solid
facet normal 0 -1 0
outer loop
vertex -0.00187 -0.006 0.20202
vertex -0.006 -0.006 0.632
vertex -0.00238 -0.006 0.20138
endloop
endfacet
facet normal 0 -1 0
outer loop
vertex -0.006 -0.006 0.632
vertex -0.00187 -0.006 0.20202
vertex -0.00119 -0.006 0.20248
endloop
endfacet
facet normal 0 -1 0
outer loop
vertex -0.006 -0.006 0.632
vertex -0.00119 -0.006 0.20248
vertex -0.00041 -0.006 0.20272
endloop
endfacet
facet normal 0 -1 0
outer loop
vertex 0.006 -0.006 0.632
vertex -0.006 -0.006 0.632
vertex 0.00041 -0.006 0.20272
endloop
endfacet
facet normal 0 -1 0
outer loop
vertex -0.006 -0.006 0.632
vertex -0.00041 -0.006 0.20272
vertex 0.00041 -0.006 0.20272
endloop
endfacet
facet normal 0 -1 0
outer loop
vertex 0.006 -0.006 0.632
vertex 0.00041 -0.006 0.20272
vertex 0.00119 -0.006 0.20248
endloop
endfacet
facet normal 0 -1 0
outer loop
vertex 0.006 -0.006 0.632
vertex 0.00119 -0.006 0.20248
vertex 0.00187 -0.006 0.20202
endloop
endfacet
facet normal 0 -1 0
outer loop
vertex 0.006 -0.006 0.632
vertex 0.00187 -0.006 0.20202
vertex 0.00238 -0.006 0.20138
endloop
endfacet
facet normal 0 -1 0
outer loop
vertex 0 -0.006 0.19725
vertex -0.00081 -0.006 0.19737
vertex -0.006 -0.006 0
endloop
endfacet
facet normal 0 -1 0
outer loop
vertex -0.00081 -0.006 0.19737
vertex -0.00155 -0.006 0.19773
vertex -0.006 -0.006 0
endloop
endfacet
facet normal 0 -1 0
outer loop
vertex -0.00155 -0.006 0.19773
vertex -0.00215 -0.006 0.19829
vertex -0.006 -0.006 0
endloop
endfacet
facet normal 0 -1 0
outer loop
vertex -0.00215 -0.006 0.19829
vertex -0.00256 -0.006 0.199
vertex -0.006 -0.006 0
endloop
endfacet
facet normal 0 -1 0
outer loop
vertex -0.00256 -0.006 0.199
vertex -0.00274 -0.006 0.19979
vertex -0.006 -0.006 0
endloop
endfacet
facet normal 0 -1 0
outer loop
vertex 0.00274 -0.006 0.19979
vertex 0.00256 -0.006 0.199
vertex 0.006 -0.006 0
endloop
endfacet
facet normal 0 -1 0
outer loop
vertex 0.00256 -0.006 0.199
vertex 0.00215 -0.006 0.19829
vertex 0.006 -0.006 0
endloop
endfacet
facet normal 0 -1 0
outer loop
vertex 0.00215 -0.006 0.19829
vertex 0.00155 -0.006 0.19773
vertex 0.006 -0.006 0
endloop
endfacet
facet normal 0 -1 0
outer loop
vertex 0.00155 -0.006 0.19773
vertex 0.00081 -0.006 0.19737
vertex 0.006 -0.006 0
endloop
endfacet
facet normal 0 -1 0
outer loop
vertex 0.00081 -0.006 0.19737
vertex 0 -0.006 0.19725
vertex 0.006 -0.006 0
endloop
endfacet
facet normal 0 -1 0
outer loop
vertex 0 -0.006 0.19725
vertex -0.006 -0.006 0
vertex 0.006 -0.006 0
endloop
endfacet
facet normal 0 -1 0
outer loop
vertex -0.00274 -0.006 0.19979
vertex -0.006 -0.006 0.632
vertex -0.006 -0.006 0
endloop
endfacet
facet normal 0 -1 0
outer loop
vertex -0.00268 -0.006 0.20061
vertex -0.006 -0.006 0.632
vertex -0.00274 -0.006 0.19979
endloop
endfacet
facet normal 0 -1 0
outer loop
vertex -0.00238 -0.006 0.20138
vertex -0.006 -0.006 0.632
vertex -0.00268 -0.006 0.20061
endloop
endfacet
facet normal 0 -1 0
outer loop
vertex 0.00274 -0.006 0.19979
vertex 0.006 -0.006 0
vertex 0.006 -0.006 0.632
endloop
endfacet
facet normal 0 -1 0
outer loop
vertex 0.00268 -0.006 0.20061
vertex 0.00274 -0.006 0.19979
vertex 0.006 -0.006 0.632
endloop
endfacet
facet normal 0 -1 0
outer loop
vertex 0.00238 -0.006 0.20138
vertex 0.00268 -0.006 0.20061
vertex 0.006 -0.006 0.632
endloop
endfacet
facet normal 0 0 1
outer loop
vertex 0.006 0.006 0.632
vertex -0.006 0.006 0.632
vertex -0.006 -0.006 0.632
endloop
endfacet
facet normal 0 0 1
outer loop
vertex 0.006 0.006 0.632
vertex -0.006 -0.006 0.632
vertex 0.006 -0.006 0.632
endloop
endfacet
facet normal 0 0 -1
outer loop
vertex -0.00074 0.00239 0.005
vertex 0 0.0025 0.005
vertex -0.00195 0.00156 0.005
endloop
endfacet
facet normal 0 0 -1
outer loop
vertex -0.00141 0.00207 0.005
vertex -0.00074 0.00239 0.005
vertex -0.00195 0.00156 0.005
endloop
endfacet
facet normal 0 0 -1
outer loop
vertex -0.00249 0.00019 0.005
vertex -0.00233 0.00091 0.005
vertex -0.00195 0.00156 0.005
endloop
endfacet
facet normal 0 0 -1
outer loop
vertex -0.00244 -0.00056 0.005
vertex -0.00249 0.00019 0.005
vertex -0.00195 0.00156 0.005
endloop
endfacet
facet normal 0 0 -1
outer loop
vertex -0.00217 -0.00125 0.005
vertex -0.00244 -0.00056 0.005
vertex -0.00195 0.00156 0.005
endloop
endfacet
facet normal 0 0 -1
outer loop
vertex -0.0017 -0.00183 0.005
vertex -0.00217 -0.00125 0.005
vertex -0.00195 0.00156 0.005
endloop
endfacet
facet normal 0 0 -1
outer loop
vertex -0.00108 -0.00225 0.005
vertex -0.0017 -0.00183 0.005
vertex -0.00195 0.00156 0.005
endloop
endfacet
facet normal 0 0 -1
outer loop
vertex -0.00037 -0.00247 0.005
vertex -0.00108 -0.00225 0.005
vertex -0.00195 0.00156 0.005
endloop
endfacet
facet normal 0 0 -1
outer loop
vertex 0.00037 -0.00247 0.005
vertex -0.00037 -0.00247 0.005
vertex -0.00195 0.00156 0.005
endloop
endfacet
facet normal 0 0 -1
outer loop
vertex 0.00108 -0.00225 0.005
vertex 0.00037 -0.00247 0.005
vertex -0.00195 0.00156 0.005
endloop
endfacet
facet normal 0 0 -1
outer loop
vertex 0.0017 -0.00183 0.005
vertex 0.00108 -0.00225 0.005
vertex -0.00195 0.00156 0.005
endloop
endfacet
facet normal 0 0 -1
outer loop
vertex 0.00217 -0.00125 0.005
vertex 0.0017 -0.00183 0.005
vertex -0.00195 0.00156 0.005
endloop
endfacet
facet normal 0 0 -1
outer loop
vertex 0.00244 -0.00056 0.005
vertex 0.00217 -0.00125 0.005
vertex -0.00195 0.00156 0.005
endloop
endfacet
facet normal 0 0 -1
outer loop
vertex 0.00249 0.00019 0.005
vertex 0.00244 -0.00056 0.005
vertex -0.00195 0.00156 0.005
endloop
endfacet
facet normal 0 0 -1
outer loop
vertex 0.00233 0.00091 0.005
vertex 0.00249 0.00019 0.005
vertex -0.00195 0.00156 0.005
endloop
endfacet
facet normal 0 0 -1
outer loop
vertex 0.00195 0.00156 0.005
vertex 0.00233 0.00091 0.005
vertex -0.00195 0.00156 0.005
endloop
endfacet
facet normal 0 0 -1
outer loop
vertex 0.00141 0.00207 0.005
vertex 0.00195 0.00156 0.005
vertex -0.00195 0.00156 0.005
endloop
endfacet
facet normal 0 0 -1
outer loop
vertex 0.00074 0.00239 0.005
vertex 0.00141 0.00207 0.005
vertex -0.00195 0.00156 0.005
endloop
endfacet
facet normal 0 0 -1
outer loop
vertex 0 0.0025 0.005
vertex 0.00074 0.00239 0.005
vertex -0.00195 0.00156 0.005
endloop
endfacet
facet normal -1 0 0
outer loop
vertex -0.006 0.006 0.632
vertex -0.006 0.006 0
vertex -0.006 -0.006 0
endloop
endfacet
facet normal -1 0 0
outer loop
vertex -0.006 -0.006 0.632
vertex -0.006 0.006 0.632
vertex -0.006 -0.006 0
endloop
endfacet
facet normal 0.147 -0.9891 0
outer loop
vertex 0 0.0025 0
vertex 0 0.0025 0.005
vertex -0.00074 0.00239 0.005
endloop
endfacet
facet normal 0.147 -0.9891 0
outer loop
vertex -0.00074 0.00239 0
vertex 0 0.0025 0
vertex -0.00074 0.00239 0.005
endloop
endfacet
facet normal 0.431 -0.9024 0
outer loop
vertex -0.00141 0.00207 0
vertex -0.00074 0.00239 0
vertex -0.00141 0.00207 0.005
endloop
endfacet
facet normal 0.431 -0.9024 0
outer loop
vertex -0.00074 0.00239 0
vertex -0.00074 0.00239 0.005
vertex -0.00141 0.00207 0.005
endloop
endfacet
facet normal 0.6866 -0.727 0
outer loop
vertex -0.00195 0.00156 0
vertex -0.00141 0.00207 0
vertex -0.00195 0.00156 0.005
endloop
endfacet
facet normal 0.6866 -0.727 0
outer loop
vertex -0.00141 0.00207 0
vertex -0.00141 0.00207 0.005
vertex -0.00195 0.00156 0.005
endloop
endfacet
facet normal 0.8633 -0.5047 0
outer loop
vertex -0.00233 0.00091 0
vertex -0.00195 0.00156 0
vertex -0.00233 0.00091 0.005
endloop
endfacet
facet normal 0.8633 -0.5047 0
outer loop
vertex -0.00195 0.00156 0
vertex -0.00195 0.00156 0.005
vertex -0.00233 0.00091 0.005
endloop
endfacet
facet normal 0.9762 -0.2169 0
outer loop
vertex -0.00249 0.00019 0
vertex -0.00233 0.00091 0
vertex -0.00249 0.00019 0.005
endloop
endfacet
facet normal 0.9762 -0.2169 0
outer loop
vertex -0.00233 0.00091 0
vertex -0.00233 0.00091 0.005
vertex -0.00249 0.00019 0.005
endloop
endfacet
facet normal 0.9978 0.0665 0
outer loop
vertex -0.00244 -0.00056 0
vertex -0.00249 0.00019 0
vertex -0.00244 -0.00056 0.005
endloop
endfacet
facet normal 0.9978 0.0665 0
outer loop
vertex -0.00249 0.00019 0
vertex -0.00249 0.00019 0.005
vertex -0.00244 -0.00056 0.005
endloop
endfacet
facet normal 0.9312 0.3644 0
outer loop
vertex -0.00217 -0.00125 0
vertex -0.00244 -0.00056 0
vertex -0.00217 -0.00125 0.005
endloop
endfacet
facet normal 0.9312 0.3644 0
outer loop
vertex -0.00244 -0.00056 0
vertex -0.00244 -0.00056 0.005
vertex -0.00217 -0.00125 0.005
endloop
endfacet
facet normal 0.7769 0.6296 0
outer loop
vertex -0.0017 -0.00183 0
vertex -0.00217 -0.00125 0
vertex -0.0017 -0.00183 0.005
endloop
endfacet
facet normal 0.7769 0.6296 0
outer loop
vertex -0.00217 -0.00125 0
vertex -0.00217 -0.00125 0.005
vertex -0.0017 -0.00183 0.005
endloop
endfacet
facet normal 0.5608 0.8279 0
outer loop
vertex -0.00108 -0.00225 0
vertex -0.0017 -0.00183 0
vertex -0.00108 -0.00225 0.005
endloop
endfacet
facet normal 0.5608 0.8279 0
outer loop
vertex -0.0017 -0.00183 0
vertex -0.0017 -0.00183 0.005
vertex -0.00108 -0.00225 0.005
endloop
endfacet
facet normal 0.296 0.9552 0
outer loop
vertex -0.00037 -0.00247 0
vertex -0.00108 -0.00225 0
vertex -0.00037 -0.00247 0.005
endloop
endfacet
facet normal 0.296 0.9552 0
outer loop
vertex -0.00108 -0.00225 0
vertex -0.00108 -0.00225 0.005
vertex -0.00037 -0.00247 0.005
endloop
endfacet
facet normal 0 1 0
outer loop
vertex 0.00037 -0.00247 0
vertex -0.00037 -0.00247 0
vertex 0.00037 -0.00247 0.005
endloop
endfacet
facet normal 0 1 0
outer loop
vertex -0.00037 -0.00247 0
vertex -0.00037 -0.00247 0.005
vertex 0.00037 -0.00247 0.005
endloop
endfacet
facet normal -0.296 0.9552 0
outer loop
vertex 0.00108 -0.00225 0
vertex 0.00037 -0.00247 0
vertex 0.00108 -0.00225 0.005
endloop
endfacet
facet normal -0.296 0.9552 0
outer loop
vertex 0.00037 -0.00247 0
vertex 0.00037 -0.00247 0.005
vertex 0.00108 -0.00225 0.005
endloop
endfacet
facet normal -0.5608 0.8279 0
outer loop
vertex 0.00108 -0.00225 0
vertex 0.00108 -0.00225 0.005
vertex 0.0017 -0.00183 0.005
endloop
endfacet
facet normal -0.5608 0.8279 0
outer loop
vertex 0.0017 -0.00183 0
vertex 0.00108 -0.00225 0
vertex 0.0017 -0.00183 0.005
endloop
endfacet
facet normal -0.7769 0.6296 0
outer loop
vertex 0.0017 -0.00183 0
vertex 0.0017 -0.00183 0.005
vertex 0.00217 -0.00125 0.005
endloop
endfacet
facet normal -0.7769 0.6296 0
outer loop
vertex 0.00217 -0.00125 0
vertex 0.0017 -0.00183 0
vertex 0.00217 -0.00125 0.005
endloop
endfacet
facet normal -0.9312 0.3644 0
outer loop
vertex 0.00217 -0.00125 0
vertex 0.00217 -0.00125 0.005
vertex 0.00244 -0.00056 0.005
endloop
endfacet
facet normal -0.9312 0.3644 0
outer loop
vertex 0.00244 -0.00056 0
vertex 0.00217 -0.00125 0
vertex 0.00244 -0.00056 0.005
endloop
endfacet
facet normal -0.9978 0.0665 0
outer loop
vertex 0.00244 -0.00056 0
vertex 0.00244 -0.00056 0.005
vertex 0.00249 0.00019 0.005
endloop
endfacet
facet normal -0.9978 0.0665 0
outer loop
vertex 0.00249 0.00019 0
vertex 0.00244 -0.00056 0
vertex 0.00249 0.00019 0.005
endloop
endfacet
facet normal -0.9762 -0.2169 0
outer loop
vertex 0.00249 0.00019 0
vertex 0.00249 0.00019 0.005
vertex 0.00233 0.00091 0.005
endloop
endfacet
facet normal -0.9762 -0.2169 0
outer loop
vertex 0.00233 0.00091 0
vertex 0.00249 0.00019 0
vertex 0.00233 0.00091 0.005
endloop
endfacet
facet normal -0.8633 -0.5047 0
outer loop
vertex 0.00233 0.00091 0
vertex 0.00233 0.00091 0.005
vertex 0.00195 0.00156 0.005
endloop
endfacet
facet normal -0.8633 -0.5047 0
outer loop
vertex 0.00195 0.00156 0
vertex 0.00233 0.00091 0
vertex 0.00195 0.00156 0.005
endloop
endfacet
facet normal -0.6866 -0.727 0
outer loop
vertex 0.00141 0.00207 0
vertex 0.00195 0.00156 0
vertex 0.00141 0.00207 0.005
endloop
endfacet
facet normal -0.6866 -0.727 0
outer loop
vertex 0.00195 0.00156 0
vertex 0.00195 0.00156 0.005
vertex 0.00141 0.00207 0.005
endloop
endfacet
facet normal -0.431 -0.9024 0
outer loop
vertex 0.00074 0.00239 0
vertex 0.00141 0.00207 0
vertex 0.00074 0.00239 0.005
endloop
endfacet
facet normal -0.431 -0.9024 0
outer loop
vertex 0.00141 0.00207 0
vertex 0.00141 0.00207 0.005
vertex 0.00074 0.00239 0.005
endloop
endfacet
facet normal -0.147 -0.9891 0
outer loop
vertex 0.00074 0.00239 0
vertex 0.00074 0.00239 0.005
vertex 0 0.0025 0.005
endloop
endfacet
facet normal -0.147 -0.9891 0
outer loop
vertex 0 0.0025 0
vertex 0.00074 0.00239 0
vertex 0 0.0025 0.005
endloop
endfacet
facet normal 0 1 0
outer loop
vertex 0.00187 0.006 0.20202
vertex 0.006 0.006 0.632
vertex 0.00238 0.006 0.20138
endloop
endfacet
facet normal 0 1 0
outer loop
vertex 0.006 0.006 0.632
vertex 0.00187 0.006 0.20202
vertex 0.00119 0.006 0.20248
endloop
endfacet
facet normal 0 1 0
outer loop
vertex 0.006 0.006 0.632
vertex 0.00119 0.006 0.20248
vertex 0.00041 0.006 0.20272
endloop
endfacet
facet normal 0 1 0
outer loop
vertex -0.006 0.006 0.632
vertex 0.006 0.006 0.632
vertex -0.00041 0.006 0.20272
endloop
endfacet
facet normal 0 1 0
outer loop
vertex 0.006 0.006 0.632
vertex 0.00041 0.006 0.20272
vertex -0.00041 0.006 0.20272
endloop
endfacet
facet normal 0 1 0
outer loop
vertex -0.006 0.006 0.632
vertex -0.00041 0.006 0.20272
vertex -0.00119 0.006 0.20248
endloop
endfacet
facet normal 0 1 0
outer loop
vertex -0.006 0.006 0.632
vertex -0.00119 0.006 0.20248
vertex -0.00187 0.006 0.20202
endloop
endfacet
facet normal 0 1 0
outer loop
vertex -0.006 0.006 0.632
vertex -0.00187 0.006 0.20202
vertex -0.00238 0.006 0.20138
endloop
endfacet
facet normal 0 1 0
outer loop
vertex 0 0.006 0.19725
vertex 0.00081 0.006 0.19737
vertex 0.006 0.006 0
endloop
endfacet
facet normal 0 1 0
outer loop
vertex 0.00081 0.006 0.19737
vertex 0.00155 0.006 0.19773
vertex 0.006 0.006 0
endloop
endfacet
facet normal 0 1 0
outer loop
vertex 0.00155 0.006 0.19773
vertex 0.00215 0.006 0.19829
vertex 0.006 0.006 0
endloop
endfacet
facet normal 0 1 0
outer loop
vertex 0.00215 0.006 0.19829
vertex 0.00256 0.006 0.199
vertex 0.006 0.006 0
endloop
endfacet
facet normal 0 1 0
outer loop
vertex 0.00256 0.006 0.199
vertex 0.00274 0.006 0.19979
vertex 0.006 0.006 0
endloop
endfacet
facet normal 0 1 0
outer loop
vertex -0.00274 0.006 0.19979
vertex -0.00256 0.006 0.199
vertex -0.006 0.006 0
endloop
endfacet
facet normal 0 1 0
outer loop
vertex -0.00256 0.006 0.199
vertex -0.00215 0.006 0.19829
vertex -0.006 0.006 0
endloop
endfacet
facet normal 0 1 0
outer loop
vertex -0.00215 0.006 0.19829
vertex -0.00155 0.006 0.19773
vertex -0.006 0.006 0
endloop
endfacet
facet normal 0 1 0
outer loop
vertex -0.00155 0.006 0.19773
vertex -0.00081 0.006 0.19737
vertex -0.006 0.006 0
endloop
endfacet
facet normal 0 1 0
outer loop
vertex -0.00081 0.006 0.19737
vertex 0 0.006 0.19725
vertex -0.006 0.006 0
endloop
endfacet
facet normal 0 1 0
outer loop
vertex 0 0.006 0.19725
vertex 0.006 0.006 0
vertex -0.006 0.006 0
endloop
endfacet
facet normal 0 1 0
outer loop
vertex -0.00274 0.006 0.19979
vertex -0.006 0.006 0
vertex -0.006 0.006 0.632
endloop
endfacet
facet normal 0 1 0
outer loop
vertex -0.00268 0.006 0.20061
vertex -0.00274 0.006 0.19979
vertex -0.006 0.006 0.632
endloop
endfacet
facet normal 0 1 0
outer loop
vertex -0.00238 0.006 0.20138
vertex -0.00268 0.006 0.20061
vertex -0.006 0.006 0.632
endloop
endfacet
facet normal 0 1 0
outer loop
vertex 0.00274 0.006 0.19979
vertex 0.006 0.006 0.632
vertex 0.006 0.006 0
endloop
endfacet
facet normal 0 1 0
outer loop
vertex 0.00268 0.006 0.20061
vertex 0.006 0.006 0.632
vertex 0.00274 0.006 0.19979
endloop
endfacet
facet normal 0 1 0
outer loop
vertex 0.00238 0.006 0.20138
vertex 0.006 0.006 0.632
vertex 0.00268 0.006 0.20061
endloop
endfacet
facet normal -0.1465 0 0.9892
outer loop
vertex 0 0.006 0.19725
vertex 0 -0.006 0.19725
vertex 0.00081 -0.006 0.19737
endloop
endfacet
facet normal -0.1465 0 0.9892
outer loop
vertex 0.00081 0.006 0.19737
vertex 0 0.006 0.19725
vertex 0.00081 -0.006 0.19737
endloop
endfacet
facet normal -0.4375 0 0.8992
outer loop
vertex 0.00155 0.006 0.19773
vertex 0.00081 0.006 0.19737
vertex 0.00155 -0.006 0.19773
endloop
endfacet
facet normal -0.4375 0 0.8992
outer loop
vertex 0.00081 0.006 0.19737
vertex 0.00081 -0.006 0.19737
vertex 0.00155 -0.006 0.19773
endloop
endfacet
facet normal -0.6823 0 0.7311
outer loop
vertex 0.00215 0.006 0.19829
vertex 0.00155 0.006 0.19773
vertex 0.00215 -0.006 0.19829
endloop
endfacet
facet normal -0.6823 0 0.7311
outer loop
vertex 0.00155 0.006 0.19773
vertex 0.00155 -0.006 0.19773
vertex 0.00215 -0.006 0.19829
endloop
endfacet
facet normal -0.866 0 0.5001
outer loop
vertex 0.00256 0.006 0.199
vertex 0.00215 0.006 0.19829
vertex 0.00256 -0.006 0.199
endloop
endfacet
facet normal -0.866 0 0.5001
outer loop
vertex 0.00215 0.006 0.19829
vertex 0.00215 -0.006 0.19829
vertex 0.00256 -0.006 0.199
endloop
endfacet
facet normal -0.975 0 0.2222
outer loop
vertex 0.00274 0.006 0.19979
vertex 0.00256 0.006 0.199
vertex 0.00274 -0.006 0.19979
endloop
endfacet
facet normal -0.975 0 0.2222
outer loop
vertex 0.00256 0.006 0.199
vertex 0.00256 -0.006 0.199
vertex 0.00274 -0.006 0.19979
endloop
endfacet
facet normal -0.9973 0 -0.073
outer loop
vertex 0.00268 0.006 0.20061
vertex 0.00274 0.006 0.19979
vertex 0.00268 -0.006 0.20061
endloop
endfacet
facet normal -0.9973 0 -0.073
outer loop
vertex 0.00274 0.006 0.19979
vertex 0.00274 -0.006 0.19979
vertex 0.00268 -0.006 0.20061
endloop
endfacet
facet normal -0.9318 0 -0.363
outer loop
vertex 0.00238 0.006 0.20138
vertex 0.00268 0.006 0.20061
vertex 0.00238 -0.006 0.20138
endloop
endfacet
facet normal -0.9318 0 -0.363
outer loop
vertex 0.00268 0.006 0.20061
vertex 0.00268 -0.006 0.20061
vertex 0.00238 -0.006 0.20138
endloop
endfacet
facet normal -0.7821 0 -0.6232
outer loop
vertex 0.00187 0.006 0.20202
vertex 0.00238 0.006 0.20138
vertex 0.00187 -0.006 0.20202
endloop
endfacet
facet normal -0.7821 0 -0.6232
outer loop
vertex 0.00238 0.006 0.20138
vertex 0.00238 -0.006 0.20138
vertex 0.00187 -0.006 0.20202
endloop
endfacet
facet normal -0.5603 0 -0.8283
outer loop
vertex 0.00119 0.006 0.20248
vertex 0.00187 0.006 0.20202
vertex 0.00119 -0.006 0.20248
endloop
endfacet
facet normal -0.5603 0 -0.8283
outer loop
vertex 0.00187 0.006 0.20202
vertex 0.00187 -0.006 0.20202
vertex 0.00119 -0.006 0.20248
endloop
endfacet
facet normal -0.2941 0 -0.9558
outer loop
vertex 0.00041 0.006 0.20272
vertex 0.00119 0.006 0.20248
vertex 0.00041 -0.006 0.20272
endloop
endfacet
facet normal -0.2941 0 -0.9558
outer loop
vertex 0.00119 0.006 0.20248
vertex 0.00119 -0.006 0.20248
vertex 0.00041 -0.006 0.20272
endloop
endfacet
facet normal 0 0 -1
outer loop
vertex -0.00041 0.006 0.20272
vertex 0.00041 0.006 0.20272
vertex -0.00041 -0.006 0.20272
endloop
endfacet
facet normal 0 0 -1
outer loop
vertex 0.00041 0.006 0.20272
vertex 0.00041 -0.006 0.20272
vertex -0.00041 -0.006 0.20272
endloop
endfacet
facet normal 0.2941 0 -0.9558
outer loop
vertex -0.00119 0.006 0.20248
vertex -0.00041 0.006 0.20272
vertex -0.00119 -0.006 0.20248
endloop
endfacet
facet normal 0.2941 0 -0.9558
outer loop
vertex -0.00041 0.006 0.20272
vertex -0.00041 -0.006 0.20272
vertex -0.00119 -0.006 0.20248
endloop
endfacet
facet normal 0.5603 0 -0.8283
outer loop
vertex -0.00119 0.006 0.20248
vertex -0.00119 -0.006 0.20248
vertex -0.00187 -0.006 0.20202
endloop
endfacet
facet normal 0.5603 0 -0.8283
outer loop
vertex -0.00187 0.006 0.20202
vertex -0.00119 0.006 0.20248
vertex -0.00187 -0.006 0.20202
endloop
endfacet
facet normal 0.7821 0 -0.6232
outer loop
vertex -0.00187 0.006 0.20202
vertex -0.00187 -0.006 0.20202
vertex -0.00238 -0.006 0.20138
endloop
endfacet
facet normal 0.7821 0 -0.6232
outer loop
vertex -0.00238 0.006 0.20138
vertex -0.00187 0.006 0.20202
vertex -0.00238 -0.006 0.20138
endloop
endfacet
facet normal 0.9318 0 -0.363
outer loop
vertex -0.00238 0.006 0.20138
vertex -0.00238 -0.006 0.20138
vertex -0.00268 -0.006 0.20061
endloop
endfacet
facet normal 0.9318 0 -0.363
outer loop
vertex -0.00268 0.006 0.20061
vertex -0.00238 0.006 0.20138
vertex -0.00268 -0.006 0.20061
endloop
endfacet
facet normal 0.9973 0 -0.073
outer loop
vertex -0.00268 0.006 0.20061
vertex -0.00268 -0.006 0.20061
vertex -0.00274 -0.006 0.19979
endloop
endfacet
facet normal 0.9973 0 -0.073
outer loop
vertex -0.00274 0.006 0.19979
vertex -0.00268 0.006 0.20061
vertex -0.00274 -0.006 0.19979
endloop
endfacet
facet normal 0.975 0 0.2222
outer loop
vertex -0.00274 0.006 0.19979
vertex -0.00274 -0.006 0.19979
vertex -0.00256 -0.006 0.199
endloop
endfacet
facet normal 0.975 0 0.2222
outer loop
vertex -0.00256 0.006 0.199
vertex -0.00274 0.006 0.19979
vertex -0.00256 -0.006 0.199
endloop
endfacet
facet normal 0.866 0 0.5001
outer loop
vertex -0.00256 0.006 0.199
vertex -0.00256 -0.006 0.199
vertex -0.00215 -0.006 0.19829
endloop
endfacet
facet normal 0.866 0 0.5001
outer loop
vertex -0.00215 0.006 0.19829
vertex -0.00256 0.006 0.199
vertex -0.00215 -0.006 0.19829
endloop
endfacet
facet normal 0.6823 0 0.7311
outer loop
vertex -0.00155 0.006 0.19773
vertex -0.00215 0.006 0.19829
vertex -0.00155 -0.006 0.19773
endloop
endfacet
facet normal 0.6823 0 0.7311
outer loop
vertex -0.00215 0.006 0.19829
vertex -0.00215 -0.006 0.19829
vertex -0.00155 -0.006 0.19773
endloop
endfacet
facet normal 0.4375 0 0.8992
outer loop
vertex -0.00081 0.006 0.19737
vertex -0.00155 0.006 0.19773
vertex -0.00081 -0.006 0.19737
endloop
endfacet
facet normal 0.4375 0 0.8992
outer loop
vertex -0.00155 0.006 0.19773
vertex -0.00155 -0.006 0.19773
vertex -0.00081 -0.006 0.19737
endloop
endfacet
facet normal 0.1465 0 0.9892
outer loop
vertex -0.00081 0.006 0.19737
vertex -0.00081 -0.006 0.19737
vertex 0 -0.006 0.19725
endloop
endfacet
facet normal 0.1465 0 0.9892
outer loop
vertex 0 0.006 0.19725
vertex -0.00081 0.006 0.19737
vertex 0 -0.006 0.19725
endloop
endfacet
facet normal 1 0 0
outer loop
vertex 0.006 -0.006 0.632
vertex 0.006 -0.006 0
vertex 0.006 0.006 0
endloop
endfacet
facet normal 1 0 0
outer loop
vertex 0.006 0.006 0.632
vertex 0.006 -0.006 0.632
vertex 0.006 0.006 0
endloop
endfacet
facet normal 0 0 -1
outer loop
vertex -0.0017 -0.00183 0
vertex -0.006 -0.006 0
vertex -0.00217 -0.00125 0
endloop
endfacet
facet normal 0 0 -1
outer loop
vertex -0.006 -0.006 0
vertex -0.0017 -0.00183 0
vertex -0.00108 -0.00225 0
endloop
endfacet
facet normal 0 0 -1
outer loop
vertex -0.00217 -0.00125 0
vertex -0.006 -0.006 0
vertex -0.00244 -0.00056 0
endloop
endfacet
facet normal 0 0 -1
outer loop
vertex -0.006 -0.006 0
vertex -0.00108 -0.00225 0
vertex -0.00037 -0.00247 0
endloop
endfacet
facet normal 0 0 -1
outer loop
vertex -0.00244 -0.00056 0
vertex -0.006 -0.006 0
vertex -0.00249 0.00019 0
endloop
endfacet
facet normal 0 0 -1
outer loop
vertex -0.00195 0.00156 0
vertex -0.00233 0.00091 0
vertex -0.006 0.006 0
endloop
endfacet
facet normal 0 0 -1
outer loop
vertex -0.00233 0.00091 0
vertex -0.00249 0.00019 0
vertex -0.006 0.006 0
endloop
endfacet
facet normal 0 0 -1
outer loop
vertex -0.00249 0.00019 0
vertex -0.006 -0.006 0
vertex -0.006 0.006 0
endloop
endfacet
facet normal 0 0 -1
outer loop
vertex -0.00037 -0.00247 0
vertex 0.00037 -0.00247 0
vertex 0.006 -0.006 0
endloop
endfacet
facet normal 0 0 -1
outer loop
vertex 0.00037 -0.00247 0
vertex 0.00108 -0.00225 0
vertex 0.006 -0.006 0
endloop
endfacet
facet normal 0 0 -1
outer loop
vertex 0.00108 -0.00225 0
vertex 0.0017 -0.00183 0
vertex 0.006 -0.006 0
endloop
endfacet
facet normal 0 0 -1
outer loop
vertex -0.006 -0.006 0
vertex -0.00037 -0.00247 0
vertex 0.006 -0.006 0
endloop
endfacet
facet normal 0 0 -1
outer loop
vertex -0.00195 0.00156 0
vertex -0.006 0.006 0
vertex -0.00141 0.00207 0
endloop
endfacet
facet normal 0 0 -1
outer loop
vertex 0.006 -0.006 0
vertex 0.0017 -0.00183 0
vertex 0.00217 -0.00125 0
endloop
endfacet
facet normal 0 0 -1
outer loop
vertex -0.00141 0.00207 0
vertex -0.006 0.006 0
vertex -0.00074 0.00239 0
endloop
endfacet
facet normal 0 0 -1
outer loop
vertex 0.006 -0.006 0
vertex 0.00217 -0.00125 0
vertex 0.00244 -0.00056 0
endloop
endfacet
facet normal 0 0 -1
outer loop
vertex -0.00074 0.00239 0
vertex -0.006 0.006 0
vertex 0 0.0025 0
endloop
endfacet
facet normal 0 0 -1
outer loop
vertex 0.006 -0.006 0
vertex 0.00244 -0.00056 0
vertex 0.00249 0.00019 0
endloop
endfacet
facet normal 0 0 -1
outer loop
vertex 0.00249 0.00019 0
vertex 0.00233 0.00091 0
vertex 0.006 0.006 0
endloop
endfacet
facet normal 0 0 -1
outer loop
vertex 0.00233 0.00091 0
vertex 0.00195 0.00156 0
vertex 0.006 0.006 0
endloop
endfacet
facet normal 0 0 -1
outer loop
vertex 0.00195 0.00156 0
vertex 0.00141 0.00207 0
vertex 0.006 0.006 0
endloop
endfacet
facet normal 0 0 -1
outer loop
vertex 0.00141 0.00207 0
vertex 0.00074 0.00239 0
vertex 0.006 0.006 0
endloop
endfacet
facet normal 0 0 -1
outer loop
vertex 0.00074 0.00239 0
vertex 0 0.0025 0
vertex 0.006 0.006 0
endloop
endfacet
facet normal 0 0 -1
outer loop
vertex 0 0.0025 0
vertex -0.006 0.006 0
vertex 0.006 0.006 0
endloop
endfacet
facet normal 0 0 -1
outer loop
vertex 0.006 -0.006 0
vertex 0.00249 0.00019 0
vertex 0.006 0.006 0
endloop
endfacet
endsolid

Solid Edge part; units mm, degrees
sketch "Sketch1" plane through (0, 0, 0) normal (0, 0, 1) x (1, 0, 0)
  line L0 (-0.006, -0.006) -> (0.006, -0.006)
  line L1 (0.006, -0.006) -> (0.006, 0.006)
  line L2 (0.006, 0.006) -> (-0.006, 0.006)
  line L3 (-0.006, 0.006) -> (-0.006, -0.006)
  dimension "D1" = 0.012
extrude "Protrusion1" add sketch "Sketch1" along normal blind 0.632
hole "Bohrung_1" at (0, -0.006, 0.2) direction (0, 1, 0) diameter 0.0055 end through all
hole "Bohrung_2" at (0, 0, 0) direction (0, 0, 1) diameter 0.005 depth 0.005
